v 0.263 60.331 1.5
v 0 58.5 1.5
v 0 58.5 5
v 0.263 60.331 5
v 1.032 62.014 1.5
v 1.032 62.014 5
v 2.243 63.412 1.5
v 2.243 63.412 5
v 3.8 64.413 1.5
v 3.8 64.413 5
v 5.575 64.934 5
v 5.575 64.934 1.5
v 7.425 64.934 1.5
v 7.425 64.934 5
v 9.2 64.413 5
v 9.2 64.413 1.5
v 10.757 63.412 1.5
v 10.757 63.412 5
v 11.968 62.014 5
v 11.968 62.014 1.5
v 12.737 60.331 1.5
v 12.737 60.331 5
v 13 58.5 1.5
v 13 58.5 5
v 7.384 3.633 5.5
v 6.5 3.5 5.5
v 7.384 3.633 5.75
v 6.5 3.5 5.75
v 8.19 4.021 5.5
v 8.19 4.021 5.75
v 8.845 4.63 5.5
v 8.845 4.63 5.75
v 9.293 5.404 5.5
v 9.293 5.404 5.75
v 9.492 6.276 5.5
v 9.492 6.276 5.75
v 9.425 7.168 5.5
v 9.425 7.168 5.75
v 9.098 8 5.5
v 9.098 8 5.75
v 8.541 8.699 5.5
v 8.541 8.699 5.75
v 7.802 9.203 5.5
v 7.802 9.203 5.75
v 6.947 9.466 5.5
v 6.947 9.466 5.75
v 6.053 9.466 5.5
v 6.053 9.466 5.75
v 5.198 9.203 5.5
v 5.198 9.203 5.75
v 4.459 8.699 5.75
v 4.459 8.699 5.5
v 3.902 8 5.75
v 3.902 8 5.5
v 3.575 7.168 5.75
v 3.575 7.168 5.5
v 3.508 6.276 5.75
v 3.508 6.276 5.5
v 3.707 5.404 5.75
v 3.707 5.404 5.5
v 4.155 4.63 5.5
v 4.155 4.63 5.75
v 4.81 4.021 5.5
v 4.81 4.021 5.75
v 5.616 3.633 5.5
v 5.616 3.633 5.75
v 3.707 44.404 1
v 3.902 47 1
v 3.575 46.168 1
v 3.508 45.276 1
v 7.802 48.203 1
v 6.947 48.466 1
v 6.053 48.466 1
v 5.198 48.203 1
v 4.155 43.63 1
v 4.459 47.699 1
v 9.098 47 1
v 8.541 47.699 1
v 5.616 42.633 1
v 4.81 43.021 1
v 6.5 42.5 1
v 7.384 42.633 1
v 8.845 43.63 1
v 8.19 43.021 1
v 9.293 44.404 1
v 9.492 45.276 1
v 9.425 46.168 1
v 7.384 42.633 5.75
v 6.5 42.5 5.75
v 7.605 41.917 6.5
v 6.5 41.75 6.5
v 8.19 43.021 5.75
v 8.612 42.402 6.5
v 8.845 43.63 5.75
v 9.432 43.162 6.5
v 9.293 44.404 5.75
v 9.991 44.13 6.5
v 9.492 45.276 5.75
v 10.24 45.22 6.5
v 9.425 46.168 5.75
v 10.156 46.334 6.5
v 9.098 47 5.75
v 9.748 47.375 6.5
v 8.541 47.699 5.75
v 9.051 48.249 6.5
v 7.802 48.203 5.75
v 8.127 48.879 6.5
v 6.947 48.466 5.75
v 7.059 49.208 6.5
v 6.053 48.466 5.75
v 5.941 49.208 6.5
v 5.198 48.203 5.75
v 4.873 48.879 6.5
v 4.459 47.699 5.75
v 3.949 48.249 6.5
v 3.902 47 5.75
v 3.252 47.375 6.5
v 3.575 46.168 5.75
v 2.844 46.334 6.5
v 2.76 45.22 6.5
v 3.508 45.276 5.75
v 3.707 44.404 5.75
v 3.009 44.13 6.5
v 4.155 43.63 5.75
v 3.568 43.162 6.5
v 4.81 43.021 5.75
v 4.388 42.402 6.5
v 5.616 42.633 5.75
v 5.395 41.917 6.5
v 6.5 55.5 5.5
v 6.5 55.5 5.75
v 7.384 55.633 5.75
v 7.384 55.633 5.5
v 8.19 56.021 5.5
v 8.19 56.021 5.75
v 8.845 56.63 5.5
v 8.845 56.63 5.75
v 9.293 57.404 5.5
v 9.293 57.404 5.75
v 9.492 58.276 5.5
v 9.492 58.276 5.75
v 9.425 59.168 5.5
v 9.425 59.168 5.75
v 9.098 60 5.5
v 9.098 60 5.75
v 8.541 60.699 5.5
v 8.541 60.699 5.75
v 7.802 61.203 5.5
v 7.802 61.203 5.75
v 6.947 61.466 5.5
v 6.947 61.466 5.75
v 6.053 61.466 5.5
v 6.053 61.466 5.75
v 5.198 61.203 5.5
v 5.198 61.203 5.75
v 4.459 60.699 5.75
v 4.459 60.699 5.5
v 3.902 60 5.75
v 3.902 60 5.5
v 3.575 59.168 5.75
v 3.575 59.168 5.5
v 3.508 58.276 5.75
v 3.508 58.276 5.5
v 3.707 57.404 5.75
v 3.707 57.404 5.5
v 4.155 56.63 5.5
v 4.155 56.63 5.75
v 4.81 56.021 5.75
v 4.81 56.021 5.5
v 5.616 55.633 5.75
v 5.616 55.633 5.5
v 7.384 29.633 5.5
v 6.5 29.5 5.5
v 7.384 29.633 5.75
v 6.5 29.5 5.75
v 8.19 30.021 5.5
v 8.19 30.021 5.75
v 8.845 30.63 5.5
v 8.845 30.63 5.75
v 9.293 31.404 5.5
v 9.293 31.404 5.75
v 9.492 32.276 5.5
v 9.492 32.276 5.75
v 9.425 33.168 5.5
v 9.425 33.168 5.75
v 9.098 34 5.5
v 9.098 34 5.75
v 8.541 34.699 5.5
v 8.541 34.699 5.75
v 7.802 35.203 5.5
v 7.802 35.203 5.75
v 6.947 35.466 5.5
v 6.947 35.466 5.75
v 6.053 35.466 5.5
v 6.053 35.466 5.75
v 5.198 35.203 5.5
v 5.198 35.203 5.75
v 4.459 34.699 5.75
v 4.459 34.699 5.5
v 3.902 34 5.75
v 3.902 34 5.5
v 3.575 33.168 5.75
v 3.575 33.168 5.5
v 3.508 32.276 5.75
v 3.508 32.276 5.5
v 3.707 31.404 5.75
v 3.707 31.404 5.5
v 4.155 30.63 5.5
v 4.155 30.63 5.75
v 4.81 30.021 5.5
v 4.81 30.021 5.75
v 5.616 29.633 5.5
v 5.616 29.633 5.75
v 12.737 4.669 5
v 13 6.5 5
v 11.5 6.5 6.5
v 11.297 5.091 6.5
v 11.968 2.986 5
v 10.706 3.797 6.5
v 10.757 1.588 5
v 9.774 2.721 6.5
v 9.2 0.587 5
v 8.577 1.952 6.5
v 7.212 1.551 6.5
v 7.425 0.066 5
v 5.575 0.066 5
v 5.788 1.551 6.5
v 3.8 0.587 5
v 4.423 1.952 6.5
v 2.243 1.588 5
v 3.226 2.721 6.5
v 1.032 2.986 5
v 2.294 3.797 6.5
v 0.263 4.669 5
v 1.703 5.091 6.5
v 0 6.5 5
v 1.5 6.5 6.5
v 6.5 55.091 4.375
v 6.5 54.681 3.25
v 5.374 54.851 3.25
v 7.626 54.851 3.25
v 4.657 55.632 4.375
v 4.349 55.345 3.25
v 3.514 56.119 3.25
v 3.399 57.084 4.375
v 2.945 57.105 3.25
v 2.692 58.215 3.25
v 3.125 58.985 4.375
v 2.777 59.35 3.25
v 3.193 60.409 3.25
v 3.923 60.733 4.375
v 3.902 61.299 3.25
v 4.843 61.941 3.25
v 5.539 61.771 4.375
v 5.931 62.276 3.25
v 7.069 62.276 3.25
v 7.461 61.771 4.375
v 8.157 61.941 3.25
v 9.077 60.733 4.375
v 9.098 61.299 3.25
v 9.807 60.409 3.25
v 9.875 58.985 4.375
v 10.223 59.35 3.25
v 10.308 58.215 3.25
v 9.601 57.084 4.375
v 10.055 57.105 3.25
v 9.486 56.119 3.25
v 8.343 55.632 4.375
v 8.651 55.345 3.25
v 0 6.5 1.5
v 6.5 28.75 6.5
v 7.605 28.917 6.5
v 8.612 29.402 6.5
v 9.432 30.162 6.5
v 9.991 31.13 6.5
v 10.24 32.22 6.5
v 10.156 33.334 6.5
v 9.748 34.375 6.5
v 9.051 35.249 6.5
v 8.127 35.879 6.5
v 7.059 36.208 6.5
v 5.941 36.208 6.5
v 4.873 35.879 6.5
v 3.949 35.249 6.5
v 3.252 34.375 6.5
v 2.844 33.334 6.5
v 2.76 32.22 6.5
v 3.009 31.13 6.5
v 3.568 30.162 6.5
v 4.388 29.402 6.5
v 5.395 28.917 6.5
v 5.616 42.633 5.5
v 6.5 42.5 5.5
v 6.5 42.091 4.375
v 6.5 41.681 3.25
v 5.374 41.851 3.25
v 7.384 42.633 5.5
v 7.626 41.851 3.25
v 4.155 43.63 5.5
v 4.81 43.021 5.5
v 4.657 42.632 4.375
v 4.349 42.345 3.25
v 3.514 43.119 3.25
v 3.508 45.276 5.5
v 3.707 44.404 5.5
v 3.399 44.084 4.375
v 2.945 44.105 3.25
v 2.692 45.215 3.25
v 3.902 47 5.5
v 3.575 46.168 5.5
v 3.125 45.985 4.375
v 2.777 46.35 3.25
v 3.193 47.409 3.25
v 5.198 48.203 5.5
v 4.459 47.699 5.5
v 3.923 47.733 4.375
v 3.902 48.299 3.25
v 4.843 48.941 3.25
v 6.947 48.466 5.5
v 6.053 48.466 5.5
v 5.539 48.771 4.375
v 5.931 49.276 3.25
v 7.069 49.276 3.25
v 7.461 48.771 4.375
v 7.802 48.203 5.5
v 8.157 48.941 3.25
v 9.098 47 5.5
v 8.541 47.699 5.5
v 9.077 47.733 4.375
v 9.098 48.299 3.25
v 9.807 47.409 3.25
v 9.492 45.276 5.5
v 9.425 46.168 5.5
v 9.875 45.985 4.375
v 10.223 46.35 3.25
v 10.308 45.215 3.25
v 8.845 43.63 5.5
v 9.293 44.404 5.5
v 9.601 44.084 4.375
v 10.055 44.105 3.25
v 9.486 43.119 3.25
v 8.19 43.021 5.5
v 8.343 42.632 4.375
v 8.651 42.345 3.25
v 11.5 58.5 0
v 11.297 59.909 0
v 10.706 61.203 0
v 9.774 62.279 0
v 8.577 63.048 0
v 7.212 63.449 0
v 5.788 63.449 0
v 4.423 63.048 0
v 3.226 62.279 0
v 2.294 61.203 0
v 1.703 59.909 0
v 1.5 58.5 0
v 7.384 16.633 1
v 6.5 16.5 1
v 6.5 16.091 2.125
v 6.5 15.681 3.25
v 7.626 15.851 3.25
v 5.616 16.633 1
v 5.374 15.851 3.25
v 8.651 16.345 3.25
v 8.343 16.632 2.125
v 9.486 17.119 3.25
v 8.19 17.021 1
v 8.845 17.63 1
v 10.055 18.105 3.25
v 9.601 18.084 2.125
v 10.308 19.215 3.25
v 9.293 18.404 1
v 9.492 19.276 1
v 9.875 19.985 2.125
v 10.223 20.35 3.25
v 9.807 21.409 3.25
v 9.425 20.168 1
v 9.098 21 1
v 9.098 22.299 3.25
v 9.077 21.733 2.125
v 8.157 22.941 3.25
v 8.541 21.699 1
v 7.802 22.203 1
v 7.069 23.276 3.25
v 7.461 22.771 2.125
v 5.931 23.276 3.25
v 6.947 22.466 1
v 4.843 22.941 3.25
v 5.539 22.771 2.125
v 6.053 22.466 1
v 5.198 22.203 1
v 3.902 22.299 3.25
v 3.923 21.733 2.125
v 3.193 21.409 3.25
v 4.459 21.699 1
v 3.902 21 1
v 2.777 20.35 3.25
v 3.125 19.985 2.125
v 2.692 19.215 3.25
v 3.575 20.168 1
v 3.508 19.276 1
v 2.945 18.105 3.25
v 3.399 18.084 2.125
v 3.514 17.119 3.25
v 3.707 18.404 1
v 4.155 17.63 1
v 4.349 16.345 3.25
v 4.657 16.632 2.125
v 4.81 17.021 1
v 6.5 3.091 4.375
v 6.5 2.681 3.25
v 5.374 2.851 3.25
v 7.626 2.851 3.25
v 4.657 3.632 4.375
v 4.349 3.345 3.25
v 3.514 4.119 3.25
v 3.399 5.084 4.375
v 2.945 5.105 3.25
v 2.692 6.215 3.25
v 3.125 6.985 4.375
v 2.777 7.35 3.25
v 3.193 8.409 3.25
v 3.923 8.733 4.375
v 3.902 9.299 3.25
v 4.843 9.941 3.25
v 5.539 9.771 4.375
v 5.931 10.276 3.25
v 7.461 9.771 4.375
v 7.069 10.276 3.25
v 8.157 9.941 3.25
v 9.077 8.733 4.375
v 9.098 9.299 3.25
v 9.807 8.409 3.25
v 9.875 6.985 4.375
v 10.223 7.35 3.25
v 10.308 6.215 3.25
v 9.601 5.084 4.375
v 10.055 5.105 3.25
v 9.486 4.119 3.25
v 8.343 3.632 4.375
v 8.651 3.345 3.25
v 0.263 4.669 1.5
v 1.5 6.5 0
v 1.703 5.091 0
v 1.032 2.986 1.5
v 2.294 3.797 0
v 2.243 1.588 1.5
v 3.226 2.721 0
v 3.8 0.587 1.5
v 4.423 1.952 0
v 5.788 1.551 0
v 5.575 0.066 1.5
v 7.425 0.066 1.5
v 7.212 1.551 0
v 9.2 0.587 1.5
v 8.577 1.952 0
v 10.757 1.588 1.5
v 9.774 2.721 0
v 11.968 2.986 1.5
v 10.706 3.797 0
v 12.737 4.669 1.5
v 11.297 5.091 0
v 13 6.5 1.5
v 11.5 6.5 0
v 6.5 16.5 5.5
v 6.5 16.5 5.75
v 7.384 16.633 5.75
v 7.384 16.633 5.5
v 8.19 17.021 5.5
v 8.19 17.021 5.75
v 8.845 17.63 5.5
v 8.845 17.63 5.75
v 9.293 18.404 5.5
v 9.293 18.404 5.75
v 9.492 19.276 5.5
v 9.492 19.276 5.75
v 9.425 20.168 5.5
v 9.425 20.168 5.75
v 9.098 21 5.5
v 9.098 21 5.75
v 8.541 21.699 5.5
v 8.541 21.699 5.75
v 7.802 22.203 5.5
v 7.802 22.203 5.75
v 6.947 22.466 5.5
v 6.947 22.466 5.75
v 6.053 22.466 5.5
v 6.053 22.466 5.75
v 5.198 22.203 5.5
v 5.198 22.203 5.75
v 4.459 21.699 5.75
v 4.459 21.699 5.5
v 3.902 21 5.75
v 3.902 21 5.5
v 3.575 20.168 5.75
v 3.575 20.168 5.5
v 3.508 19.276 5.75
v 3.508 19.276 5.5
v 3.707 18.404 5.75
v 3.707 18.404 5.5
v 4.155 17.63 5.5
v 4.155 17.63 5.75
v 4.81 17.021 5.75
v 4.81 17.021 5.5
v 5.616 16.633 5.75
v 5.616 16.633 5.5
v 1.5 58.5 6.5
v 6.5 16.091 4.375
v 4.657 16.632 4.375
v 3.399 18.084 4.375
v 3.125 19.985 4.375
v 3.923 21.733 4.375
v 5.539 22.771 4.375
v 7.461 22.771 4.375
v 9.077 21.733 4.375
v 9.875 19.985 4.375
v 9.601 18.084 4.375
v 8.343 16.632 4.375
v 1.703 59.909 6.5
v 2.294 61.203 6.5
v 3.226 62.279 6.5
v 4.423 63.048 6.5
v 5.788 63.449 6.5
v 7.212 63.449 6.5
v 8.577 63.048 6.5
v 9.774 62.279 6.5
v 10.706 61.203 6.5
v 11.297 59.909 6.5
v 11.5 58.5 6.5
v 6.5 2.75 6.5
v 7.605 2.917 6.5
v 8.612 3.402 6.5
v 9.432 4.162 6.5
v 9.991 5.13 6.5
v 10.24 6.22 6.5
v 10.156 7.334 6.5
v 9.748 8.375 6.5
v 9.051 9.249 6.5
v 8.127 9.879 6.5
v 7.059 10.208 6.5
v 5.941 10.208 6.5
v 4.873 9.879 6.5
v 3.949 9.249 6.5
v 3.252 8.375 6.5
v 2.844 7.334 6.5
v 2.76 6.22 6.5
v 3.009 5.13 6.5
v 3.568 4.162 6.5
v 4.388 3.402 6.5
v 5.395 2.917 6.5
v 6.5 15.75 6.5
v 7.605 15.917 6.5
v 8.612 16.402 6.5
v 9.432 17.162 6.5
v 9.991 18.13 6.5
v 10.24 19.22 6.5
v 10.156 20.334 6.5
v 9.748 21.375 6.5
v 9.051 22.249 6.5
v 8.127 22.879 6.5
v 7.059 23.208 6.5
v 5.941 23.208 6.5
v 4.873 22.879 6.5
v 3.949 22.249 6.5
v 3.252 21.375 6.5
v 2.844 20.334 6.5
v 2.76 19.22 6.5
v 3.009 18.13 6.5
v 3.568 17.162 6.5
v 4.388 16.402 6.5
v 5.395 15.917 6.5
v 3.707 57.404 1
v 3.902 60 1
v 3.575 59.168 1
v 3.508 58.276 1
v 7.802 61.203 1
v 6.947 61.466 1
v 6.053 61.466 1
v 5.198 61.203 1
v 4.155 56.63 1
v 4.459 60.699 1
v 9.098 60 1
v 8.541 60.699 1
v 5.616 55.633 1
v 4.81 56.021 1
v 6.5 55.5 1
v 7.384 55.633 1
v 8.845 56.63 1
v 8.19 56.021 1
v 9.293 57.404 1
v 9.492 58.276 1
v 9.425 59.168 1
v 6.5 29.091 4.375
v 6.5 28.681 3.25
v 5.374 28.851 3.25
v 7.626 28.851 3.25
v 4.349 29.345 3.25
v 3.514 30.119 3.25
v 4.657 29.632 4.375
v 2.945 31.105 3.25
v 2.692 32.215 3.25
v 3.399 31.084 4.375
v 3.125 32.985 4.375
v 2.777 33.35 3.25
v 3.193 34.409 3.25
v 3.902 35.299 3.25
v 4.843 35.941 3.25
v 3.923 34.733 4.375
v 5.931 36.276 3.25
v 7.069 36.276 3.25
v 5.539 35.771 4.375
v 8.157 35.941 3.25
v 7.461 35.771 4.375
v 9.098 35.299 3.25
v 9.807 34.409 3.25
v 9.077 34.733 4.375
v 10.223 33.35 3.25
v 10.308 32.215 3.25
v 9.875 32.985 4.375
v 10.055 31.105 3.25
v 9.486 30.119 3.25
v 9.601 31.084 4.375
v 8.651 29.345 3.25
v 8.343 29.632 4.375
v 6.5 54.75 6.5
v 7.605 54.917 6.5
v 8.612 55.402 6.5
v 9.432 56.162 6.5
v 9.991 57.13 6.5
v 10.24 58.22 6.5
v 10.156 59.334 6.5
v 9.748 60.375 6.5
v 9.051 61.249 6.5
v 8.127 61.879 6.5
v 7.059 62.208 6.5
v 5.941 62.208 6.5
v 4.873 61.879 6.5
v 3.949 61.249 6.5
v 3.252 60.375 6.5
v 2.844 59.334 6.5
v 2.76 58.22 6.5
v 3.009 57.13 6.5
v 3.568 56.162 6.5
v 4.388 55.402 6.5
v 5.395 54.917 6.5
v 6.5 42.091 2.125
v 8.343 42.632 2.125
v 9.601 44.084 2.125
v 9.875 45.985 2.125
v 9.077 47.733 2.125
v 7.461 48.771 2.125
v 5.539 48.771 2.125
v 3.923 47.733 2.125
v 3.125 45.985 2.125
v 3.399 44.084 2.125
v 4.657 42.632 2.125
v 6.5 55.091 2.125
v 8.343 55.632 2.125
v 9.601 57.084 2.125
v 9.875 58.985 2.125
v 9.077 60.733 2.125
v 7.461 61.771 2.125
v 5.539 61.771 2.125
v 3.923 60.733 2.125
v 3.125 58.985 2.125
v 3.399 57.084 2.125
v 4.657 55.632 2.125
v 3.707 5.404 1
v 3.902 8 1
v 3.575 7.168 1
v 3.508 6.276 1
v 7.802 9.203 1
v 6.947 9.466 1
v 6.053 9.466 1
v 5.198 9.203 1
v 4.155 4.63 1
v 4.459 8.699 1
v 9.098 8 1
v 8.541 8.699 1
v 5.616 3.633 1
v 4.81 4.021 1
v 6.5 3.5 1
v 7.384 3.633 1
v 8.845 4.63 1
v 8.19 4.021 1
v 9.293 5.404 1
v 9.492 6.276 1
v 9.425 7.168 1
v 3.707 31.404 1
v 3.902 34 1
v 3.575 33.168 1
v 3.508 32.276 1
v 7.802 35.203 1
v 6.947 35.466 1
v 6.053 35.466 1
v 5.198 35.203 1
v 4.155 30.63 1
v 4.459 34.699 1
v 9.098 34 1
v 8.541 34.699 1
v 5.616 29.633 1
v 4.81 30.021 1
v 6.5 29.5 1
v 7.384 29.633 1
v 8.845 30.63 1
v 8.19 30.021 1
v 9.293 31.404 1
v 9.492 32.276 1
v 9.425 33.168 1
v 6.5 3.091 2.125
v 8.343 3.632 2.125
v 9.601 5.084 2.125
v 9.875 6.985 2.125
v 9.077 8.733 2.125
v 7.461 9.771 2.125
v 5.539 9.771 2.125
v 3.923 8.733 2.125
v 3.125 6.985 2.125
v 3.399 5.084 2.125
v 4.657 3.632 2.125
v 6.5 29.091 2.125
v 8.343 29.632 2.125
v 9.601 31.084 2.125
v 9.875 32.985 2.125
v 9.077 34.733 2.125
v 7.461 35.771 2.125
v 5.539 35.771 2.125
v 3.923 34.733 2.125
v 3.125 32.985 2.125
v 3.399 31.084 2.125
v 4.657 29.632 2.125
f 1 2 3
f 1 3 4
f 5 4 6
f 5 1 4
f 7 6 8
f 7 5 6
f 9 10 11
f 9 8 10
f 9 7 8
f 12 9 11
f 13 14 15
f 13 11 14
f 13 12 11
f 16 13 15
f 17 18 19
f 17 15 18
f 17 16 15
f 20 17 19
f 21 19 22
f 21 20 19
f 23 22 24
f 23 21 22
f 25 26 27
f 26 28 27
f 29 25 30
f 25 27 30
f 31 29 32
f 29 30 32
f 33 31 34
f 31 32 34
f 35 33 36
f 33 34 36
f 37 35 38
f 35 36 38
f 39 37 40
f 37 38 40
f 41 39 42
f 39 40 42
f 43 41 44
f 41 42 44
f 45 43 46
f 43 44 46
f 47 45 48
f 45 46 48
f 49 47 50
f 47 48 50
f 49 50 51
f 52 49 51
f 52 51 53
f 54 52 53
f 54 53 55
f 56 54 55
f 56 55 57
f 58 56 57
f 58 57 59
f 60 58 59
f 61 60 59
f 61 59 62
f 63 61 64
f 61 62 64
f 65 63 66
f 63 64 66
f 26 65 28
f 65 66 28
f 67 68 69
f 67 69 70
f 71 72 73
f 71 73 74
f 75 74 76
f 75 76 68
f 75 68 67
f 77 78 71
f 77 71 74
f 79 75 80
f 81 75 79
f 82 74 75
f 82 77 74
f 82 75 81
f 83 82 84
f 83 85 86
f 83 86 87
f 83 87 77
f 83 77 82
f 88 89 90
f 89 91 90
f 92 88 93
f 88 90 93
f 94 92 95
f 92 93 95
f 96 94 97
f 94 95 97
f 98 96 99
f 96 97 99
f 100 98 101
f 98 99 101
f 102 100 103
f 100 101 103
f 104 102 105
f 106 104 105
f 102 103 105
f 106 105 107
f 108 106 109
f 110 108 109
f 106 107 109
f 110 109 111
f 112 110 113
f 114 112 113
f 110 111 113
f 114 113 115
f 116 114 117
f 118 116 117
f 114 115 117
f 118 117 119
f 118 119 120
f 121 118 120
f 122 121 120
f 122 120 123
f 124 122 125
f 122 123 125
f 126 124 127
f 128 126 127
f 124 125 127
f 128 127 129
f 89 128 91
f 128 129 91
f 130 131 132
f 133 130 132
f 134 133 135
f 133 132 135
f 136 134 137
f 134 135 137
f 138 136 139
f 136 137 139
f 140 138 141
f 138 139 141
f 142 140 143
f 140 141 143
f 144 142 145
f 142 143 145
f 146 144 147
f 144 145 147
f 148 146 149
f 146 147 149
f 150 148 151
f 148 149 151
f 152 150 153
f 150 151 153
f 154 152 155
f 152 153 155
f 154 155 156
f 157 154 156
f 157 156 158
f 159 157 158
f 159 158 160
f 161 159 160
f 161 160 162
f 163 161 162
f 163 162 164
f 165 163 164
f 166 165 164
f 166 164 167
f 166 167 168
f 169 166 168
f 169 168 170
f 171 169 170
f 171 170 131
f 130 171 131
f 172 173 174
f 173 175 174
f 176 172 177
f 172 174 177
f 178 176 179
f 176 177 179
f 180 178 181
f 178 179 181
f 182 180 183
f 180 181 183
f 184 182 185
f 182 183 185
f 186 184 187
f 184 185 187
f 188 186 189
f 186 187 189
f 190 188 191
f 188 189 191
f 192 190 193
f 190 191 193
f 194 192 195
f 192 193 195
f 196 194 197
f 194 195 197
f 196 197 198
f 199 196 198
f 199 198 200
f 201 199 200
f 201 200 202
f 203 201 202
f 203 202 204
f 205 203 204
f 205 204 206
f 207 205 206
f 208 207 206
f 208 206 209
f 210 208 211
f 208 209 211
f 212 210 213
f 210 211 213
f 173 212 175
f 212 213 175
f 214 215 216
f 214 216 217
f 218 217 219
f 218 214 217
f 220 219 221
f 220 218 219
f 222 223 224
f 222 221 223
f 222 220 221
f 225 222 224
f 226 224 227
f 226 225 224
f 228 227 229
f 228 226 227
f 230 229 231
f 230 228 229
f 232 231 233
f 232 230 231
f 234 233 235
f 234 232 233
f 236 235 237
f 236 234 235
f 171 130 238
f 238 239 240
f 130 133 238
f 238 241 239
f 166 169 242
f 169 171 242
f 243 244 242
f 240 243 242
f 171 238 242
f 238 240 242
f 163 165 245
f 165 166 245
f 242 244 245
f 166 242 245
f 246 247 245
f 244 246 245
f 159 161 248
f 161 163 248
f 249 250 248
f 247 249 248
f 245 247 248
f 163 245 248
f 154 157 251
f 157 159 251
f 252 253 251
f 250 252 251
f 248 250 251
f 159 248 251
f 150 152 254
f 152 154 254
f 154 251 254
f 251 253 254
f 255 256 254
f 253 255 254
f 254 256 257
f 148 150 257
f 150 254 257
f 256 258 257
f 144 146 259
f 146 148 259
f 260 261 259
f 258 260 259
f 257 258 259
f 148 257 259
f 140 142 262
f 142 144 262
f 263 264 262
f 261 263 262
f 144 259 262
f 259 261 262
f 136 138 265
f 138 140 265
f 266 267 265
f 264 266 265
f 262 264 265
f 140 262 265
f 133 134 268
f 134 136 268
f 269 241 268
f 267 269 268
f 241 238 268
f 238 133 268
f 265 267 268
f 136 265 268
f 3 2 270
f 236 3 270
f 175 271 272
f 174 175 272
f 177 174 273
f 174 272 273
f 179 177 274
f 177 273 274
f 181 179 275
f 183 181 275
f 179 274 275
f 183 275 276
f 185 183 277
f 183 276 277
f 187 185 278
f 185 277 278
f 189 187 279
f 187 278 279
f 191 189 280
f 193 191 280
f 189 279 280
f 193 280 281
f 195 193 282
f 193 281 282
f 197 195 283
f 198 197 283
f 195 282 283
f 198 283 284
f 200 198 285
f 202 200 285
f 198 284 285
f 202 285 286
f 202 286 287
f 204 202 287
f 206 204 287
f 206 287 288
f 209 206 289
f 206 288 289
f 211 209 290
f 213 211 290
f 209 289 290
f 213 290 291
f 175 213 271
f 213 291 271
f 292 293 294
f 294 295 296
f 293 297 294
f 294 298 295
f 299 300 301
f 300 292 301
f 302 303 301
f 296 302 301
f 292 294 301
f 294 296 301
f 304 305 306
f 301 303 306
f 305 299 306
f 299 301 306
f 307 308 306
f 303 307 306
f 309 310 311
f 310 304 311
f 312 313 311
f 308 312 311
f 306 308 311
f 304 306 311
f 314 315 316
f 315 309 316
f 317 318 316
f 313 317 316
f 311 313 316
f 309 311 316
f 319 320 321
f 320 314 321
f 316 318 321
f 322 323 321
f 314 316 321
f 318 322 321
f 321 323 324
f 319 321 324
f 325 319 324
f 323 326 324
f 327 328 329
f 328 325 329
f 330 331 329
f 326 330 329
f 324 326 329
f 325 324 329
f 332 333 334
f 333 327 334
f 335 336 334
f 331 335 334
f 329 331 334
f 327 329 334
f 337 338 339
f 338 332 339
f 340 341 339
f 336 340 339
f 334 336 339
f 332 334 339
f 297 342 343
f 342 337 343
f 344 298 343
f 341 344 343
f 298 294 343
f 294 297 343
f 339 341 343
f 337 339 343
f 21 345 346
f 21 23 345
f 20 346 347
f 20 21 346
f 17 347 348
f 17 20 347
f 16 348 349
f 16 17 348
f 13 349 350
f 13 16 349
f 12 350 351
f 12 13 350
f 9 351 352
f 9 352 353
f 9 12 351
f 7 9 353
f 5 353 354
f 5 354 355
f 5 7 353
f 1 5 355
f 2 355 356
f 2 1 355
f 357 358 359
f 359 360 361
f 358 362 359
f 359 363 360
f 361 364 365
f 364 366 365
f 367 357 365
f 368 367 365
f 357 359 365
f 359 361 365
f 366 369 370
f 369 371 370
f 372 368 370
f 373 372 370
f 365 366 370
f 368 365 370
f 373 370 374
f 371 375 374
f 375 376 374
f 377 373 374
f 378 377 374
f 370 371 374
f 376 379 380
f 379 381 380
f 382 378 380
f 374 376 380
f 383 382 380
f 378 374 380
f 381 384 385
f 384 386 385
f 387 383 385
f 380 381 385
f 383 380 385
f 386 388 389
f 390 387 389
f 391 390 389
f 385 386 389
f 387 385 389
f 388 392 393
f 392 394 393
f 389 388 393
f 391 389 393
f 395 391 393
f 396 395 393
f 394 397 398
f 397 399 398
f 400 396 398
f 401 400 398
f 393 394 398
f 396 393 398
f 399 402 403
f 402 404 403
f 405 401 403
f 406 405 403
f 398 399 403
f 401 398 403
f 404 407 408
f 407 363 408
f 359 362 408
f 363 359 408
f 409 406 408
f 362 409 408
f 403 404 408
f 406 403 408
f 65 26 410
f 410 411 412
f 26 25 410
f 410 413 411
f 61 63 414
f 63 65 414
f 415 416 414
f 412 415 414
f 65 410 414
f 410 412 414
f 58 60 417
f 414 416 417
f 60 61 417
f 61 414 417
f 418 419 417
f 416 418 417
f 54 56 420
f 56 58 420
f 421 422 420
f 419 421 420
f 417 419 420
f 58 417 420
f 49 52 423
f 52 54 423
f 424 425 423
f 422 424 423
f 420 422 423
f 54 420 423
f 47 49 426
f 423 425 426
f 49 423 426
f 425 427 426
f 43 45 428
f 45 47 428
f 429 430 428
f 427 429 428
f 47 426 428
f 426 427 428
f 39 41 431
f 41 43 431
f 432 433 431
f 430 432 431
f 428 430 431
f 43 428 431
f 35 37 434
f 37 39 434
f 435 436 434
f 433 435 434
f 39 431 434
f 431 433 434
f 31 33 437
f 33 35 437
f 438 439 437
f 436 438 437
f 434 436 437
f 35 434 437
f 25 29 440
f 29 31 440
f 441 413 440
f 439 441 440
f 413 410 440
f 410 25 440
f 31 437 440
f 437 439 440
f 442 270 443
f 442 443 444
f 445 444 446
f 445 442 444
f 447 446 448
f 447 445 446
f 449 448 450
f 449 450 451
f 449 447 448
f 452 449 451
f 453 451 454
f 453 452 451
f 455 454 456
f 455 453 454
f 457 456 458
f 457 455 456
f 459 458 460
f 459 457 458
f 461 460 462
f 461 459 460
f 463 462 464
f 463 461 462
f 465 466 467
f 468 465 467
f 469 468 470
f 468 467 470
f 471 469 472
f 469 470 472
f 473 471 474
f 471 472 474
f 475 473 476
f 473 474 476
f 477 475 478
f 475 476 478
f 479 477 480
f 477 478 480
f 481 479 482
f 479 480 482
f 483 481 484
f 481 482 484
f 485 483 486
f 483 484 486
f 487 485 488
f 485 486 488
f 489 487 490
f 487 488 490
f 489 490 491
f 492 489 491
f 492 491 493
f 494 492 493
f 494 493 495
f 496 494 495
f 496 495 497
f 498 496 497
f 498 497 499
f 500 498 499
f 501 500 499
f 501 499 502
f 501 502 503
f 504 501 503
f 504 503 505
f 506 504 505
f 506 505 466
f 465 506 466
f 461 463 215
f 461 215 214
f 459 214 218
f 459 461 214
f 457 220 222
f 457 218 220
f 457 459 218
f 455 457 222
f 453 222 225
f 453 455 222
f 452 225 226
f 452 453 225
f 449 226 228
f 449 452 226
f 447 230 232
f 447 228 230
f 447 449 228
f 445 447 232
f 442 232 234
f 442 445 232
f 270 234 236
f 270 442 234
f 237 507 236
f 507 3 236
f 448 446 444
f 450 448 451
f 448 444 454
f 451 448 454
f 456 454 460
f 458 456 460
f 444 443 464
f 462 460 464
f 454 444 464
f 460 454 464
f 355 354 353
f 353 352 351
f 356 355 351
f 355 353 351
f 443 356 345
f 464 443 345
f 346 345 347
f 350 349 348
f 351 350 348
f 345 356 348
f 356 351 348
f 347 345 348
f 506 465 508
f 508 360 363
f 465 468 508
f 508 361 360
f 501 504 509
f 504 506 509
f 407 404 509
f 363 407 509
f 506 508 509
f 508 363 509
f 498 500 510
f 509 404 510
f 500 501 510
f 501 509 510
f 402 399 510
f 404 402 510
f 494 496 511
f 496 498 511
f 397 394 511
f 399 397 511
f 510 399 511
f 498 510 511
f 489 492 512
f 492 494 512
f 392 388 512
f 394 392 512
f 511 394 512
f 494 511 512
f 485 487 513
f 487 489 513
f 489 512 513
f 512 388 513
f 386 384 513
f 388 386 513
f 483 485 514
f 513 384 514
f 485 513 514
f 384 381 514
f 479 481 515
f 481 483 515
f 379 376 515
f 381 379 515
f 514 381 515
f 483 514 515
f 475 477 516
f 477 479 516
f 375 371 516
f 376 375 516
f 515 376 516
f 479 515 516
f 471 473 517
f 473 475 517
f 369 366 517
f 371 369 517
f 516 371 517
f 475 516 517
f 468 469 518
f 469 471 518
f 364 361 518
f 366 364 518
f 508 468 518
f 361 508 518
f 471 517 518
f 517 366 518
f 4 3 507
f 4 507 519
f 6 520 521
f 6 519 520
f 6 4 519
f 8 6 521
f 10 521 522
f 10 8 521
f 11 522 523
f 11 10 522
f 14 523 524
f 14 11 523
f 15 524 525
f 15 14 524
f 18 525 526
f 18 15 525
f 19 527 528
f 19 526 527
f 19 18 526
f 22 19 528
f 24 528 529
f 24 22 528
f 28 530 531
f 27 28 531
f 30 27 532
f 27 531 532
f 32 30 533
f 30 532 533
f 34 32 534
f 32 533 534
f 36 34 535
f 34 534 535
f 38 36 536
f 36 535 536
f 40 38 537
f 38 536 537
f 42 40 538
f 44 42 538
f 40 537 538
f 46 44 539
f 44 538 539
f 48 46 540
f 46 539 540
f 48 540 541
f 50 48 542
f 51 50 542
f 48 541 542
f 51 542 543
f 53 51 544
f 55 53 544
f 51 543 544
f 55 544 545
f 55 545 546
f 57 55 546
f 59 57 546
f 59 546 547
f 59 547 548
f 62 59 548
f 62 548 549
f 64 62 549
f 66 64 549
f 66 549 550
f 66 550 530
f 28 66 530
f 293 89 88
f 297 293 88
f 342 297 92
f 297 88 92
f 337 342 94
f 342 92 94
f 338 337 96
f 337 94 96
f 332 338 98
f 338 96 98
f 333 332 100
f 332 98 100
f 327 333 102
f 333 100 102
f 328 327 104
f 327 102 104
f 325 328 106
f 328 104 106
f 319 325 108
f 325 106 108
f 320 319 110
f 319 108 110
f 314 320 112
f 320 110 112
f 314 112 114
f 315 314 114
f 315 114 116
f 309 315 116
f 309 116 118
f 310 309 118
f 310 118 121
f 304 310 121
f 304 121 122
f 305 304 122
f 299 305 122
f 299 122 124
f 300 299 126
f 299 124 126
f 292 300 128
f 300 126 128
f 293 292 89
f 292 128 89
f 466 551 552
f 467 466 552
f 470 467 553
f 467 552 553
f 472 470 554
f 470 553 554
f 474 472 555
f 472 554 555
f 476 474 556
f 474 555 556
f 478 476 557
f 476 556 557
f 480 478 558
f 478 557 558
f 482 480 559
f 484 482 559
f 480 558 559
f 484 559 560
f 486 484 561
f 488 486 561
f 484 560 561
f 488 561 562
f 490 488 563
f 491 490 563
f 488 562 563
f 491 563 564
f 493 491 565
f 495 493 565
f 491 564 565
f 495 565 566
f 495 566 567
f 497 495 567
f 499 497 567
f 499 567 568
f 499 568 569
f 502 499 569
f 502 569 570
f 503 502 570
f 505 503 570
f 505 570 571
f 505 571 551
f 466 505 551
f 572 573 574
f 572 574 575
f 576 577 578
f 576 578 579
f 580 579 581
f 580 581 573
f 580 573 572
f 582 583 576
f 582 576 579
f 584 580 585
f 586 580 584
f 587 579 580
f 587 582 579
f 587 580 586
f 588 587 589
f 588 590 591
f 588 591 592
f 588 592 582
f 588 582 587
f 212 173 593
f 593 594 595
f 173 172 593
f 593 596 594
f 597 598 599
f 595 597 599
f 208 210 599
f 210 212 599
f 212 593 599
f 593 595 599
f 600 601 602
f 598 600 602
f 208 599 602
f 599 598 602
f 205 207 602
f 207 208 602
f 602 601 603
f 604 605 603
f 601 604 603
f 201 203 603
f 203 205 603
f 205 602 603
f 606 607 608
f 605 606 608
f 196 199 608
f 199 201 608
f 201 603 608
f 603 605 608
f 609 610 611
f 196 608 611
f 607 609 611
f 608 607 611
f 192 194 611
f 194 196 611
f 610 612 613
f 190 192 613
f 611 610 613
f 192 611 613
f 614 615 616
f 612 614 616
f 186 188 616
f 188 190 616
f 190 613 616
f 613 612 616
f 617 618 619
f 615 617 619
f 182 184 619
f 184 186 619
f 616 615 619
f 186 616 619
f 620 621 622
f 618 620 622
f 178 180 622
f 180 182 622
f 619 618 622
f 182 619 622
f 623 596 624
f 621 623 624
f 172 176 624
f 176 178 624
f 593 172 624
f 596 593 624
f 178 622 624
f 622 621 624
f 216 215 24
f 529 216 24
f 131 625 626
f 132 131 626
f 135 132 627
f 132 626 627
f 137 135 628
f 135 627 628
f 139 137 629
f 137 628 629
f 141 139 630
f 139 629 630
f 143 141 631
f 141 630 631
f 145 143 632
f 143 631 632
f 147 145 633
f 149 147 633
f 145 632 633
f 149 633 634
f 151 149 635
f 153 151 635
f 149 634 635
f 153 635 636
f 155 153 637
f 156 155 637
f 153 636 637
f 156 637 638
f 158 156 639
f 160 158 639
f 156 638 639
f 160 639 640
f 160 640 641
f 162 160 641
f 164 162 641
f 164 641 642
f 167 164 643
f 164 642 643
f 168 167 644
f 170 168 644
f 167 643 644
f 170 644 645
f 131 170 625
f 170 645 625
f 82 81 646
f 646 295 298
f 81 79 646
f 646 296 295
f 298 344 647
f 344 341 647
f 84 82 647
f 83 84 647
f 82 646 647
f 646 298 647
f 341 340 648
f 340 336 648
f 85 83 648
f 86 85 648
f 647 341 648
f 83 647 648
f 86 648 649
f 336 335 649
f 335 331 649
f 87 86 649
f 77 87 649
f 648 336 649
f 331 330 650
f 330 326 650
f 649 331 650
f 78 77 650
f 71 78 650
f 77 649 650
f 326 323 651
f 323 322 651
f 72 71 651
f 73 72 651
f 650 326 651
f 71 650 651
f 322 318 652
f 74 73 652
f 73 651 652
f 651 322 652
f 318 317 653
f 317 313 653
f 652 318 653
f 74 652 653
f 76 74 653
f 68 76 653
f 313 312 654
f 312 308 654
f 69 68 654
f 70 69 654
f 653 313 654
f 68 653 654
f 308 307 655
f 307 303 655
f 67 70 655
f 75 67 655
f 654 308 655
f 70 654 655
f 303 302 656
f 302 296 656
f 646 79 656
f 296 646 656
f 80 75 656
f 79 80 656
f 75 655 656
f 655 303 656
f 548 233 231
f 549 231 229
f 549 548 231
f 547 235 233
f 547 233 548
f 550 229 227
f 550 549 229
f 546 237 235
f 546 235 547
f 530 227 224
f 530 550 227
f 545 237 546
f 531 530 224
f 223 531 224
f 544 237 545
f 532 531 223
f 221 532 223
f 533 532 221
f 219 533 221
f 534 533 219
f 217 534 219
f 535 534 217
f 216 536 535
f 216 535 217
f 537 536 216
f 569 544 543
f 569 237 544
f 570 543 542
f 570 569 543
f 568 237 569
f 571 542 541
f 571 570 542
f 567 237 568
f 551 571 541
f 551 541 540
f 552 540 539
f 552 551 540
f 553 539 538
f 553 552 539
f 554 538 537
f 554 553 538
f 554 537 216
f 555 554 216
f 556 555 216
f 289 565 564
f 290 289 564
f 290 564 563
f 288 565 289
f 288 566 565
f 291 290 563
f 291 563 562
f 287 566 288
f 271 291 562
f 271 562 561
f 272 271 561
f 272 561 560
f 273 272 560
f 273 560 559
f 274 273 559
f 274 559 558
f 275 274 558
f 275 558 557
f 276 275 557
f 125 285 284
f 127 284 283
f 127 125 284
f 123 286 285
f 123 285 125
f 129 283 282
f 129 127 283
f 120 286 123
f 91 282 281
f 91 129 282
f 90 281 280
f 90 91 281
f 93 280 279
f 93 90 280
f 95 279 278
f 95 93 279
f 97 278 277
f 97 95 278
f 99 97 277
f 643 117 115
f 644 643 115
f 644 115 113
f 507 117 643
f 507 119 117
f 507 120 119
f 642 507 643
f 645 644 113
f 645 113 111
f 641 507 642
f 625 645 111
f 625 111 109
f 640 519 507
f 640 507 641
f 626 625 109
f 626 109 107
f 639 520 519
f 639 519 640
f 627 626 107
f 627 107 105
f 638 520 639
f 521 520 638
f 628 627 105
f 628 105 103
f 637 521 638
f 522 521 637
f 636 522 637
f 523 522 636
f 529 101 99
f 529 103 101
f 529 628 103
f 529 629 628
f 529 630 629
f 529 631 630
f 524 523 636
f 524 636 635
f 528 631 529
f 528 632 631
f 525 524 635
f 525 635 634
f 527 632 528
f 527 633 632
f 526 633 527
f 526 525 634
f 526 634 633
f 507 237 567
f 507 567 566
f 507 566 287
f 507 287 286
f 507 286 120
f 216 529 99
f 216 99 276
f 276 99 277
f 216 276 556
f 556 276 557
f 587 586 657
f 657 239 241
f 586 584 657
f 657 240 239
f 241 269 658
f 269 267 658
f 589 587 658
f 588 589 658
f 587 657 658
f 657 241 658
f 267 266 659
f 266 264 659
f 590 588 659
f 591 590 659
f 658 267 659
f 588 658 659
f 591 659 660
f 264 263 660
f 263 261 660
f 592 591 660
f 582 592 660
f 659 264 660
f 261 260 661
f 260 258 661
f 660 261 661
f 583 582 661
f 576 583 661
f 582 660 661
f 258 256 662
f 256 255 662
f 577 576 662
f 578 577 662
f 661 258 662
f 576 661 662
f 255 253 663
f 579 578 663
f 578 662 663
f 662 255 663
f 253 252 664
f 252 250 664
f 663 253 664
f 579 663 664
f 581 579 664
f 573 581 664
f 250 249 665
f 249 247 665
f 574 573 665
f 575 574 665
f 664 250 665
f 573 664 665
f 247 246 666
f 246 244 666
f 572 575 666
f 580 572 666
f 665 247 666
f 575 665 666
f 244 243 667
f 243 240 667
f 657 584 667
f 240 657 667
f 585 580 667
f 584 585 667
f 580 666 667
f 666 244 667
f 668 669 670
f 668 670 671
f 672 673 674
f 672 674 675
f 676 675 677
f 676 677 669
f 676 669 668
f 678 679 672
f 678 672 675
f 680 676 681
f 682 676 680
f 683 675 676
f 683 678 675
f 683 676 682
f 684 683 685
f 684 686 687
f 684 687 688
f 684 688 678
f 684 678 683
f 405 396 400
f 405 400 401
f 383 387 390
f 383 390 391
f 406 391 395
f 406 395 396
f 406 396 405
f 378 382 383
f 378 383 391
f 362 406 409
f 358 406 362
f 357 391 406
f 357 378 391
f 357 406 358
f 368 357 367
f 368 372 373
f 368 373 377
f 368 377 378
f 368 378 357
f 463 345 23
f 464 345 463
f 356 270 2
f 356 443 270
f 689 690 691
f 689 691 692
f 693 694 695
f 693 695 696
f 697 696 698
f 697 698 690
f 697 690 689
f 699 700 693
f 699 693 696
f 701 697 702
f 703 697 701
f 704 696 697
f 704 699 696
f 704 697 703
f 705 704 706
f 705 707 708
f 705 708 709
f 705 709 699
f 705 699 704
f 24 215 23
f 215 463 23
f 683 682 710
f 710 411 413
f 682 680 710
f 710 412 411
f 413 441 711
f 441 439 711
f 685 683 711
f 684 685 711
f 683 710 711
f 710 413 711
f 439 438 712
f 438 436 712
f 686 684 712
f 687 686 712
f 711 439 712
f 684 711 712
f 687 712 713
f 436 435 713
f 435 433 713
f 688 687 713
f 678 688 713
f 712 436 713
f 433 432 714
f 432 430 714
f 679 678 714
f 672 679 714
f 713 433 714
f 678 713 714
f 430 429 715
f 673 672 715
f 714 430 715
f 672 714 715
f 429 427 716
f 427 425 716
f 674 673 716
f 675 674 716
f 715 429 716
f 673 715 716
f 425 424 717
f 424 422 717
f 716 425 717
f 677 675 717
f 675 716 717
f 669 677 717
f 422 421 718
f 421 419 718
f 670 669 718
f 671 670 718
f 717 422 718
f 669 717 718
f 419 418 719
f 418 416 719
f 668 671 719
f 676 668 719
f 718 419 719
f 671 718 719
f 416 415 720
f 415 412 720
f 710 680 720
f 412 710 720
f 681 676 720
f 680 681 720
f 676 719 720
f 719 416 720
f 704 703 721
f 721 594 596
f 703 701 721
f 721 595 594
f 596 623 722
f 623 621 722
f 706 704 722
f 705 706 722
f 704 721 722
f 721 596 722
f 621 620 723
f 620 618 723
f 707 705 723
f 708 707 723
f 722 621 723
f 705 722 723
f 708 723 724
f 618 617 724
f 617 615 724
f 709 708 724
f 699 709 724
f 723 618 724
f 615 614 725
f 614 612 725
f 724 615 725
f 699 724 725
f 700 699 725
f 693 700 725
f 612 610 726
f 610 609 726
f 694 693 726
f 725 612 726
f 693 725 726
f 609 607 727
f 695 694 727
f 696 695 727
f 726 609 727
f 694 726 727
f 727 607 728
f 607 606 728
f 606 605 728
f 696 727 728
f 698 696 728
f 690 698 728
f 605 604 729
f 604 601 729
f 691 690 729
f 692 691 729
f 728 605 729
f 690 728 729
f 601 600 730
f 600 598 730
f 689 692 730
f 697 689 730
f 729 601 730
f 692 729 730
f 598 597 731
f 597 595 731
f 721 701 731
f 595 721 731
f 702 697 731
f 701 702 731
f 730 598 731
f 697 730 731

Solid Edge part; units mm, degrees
sketch "Sketch1" plane through (0, 0, 0) normal (0, 0, 1) x (1, 0, 0)
  line L0 (0, 58.5) -> (0, 6.5)
  line L1 (13, 6.5) -> (13, 58.5)
  arc A0 (13, 6.5) -> (0, 6.5) centre (6.5, 6.5) cw
  arc A1 (0, 58.5) -> (13, 58.5) centre (6.5, 58.5) cw
extrude "Protrusion1" add sketch "Sketch1" along normal blind 6.5
sketch "Sketch2" plane through (6.5, 0, 0) normal (1, 0, 0) x (0, 1, 0)
  line L0 (3.5, 5.5) -> (3.5, 6.5)
  line L1 (3.5, 6.5) -> (6.5, 6.5)
  line L2 (6.5, 1) -> (6.5, 6.5)
  line L3 (3.5, 1) -> (6.5, 1)
  line L4 (3.5, 1) -> (2.6811, 3.25)
  line L5 (3.5, 5.5) -> (2.6811, 3.25)
revolve "RevolvedCutout1" cut sketch "Sketch2" angle 360 about axis through (6.5, 6.5, 1) along (0, 0, 1)
chamfer "Chaflán_38" distance 0.75 angle 45 1 edges at (6.5, 3.5, 6.5)
pattern_linear "Pattern1" count 5 spacing 13 along (0, 1, 0) of "RevolvedCutout1", "Chaflán_38"
chamfer "Chaflán_39" distance 1.5 angle 45 8 edges at (13, 32.5, 6.5) (6.5, 0, 6.5) (0, 32.5, 6.5) (6.5, 65, 6.5) (13, 32.5, 0) (6.5, 0, 0) (0, 32.5, 0) (6.5, 65, 0)
